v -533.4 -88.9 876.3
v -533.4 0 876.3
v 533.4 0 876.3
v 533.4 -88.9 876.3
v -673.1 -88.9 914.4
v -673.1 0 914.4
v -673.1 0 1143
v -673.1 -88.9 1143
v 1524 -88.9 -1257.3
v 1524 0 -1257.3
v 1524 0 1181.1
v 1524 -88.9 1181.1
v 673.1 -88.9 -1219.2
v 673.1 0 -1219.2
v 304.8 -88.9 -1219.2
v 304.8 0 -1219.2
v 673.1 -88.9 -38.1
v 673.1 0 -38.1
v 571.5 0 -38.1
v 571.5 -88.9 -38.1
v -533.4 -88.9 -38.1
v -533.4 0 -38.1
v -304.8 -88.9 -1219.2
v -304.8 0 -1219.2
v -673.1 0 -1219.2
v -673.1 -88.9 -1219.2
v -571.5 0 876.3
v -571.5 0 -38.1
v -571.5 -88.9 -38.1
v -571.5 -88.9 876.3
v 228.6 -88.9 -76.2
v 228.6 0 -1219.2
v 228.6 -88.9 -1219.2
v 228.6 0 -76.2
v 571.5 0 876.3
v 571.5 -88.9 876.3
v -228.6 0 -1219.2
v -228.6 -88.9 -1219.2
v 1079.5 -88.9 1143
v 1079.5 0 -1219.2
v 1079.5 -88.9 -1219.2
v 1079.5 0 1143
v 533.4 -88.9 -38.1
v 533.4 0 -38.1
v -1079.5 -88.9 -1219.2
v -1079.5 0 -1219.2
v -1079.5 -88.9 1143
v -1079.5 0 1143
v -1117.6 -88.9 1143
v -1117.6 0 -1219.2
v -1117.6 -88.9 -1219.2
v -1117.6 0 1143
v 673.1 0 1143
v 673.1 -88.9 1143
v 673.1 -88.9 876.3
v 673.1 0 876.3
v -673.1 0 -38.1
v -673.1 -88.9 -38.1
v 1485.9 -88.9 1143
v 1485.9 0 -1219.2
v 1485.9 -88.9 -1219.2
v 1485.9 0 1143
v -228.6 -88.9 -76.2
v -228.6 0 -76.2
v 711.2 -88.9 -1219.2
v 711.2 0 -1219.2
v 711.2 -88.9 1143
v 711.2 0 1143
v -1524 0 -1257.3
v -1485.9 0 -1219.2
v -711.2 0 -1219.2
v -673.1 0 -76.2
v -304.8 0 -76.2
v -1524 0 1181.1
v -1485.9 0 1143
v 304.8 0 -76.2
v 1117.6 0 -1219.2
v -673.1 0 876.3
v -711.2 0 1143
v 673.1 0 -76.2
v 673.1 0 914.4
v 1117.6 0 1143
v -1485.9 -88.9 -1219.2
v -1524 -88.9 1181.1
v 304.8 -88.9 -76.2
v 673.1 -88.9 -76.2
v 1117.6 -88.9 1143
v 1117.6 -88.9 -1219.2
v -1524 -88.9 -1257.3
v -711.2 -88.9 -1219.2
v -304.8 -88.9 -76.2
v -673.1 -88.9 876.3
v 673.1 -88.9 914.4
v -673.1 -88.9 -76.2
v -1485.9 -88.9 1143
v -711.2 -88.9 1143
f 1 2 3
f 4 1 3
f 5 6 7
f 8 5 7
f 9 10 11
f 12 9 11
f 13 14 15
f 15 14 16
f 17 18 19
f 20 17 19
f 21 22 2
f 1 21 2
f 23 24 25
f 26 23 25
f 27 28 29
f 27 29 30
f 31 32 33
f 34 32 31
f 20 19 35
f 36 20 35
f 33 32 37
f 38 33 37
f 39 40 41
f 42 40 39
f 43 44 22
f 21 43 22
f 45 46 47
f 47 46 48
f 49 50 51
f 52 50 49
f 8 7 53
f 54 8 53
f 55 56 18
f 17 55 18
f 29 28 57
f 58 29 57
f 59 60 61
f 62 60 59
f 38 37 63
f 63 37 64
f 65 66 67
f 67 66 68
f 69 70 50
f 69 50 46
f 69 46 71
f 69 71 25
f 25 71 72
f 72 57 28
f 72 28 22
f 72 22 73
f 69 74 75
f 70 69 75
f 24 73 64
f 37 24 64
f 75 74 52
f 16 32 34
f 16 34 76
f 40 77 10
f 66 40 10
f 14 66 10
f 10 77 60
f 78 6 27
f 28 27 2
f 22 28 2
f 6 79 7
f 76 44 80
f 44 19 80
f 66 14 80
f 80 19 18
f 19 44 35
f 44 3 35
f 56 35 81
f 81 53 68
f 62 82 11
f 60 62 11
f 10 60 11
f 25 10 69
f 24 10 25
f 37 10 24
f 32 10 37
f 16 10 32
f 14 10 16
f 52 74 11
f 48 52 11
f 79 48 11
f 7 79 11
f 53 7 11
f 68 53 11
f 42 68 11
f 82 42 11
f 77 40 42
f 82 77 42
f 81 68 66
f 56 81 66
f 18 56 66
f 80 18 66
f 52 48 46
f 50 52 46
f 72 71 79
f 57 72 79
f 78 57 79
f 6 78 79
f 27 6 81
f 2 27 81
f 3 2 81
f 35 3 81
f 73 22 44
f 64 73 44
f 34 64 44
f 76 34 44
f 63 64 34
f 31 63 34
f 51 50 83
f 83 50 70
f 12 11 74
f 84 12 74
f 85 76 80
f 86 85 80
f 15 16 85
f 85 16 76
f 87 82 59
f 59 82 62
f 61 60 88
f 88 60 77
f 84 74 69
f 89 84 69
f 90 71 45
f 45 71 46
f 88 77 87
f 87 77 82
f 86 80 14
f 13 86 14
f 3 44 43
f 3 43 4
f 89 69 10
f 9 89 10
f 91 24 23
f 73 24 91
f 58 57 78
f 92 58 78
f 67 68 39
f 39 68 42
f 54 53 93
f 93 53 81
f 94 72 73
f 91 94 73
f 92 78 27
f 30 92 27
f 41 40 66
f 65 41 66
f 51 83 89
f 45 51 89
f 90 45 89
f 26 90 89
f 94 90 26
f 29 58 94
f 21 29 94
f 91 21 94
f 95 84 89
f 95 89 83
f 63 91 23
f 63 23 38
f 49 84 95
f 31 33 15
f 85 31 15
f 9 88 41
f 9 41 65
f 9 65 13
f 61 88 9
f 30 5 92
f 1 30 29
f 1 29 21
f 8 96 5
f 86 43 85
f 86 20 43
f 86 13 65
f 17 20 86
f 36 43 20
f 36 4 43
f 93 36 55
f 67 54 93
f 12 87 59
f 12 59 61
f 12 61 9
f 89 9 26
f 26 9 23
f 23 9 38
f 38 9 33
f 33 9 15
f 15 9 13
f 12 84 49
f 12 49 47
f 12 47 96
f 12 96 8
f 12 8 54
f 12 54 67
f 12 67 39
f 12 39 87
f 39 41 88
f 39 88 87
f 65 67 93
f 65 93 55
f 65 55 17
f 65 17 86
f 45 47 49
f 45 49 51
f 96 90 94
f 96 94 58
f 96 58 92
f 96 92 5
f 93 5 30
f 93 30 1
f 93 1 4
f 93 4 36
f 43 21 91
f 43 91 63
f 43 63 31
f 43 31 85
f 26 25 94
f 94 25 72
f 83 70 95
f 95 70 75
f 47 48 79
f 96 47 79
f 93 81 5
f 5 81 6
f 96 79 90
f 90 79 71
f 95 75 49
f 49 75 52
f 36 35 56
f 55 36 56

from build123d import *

# Parameters (mm, degrees)
F0_W     = 38.1
F0_H     = 2362.2
F0_H_2   = 1143
F0_H_3   = 914.4
F1_DEPTH = 88.9


# Not quite as in the source:
# - a feature names something its author has since deleted; it is built from what else it names


with BuildPart() as f1:
    # F0 (on Front) → F1 (new body)
    with BuildSketch(Plane.XZ):
        Polygon((1524, -1219.2), (1485.9, -1219.2), (1117.6, -1219.2), (1079.5, -1219.2), (711.2, -1219.2), (673.1, -1219.2), (304.8, -1219.2), (266.7, -1219.2), (228.6, -1219.2), (0, -1219.2), (-228.6, -1219.2), (-266.7, -1219.2), (-304.8, -1219.2), (-673.1, -1219.2), (-711.2, -1219.2), (-1079.5, -1219.2), (-1117.6, -1219.2), (-1485.9, -1219.2), (-1524, -1219.2), (-1524, -1257.3), (1524, -1257.3), align=None)
        with Locations((1504.95, -38.1)):
            Rectangle(F0_W, F0_H)
        with Locations((1098.55, -38.1)):
            Rectangle(F0_W, F0_H)
        Polygon((1117.6, 1143), (1485.9, 1143), (1524, 1143), (1524, 1181.1), (-1524, 1181.1), (-1524, 1143), (-1485.9, 1143), (-1117.6, 1143), (-1079.5, 1143), (-711.2, 1143), (-673.1, 1143), (673.1, 1143), (711.2, 1143), (1079.5, 1143), align=None)
        Polygon((673.1, -1219.2), (711.2, -1219.2), (711.2, 1143), (673.1, 1143), (673.1, 914.4), (673.1, 876.3), (673.1, -38.1), (673.1, -76.2), align=None)
        with Locations((-1504.95, -38.1)):
            Rectangle(F0_W, F0_H)
        with Locations((285.75, -647.7)):
            Rectangle(F0_W, F0_H_2)
        Polygon((304.8, -76.2), (673.1, -76.2), (673.1, -38.1), (571.5, -38.1), (533.4, -38.1), (-533.4, -38.1), (-571.5, -38.1), (-673.1, -38.1), (-673.1, -76.2), (-304.8, -76.2), (-266.7, -76.2), (-228.6, -76.2), (228.6, -76.2), (266.7, -76.2), align=None)
        with Locations((247.65, -647.7)):
            Rectangle(F0_W, F0_H_2)
        Polygon((673.1, 876.3), (673.1, 914.4), (-673.1, 914.4), (-673.1, 876.3), (-571.5, 876.3), (-533.4, 876.3), (533.4, 876.3), (571.5, 876.3), align=None)
        Polygon((-673.1, 914.4), (-673.1, 1143), (-711.2, 1143), (-711.2, -1219.2), (-673.1, -1219.2), (-673.1, -76.2), (-673.1, -38.1), (-673.1, 876.3), align=None)
        with Locations((-1098.55, -38.1)):
            Rectangle(F0_W, F0_H)
        with Locations((552.45, 419.1)):
            Rectangle(F0_W, F0_H_3)
        with Locations((-247.65, -647.7)):
            Rectangle(F0_W, F0_H_2)
        with Locations((-552.45, 419.1)):
            Rectangle(F0_W, F0_H_3)
        with Locations((-285.75, -647.7)):
            Rectangle(F0_W, F0_H_2)
    extrude(amount=F1_DEPTH)


solid = f1.part
